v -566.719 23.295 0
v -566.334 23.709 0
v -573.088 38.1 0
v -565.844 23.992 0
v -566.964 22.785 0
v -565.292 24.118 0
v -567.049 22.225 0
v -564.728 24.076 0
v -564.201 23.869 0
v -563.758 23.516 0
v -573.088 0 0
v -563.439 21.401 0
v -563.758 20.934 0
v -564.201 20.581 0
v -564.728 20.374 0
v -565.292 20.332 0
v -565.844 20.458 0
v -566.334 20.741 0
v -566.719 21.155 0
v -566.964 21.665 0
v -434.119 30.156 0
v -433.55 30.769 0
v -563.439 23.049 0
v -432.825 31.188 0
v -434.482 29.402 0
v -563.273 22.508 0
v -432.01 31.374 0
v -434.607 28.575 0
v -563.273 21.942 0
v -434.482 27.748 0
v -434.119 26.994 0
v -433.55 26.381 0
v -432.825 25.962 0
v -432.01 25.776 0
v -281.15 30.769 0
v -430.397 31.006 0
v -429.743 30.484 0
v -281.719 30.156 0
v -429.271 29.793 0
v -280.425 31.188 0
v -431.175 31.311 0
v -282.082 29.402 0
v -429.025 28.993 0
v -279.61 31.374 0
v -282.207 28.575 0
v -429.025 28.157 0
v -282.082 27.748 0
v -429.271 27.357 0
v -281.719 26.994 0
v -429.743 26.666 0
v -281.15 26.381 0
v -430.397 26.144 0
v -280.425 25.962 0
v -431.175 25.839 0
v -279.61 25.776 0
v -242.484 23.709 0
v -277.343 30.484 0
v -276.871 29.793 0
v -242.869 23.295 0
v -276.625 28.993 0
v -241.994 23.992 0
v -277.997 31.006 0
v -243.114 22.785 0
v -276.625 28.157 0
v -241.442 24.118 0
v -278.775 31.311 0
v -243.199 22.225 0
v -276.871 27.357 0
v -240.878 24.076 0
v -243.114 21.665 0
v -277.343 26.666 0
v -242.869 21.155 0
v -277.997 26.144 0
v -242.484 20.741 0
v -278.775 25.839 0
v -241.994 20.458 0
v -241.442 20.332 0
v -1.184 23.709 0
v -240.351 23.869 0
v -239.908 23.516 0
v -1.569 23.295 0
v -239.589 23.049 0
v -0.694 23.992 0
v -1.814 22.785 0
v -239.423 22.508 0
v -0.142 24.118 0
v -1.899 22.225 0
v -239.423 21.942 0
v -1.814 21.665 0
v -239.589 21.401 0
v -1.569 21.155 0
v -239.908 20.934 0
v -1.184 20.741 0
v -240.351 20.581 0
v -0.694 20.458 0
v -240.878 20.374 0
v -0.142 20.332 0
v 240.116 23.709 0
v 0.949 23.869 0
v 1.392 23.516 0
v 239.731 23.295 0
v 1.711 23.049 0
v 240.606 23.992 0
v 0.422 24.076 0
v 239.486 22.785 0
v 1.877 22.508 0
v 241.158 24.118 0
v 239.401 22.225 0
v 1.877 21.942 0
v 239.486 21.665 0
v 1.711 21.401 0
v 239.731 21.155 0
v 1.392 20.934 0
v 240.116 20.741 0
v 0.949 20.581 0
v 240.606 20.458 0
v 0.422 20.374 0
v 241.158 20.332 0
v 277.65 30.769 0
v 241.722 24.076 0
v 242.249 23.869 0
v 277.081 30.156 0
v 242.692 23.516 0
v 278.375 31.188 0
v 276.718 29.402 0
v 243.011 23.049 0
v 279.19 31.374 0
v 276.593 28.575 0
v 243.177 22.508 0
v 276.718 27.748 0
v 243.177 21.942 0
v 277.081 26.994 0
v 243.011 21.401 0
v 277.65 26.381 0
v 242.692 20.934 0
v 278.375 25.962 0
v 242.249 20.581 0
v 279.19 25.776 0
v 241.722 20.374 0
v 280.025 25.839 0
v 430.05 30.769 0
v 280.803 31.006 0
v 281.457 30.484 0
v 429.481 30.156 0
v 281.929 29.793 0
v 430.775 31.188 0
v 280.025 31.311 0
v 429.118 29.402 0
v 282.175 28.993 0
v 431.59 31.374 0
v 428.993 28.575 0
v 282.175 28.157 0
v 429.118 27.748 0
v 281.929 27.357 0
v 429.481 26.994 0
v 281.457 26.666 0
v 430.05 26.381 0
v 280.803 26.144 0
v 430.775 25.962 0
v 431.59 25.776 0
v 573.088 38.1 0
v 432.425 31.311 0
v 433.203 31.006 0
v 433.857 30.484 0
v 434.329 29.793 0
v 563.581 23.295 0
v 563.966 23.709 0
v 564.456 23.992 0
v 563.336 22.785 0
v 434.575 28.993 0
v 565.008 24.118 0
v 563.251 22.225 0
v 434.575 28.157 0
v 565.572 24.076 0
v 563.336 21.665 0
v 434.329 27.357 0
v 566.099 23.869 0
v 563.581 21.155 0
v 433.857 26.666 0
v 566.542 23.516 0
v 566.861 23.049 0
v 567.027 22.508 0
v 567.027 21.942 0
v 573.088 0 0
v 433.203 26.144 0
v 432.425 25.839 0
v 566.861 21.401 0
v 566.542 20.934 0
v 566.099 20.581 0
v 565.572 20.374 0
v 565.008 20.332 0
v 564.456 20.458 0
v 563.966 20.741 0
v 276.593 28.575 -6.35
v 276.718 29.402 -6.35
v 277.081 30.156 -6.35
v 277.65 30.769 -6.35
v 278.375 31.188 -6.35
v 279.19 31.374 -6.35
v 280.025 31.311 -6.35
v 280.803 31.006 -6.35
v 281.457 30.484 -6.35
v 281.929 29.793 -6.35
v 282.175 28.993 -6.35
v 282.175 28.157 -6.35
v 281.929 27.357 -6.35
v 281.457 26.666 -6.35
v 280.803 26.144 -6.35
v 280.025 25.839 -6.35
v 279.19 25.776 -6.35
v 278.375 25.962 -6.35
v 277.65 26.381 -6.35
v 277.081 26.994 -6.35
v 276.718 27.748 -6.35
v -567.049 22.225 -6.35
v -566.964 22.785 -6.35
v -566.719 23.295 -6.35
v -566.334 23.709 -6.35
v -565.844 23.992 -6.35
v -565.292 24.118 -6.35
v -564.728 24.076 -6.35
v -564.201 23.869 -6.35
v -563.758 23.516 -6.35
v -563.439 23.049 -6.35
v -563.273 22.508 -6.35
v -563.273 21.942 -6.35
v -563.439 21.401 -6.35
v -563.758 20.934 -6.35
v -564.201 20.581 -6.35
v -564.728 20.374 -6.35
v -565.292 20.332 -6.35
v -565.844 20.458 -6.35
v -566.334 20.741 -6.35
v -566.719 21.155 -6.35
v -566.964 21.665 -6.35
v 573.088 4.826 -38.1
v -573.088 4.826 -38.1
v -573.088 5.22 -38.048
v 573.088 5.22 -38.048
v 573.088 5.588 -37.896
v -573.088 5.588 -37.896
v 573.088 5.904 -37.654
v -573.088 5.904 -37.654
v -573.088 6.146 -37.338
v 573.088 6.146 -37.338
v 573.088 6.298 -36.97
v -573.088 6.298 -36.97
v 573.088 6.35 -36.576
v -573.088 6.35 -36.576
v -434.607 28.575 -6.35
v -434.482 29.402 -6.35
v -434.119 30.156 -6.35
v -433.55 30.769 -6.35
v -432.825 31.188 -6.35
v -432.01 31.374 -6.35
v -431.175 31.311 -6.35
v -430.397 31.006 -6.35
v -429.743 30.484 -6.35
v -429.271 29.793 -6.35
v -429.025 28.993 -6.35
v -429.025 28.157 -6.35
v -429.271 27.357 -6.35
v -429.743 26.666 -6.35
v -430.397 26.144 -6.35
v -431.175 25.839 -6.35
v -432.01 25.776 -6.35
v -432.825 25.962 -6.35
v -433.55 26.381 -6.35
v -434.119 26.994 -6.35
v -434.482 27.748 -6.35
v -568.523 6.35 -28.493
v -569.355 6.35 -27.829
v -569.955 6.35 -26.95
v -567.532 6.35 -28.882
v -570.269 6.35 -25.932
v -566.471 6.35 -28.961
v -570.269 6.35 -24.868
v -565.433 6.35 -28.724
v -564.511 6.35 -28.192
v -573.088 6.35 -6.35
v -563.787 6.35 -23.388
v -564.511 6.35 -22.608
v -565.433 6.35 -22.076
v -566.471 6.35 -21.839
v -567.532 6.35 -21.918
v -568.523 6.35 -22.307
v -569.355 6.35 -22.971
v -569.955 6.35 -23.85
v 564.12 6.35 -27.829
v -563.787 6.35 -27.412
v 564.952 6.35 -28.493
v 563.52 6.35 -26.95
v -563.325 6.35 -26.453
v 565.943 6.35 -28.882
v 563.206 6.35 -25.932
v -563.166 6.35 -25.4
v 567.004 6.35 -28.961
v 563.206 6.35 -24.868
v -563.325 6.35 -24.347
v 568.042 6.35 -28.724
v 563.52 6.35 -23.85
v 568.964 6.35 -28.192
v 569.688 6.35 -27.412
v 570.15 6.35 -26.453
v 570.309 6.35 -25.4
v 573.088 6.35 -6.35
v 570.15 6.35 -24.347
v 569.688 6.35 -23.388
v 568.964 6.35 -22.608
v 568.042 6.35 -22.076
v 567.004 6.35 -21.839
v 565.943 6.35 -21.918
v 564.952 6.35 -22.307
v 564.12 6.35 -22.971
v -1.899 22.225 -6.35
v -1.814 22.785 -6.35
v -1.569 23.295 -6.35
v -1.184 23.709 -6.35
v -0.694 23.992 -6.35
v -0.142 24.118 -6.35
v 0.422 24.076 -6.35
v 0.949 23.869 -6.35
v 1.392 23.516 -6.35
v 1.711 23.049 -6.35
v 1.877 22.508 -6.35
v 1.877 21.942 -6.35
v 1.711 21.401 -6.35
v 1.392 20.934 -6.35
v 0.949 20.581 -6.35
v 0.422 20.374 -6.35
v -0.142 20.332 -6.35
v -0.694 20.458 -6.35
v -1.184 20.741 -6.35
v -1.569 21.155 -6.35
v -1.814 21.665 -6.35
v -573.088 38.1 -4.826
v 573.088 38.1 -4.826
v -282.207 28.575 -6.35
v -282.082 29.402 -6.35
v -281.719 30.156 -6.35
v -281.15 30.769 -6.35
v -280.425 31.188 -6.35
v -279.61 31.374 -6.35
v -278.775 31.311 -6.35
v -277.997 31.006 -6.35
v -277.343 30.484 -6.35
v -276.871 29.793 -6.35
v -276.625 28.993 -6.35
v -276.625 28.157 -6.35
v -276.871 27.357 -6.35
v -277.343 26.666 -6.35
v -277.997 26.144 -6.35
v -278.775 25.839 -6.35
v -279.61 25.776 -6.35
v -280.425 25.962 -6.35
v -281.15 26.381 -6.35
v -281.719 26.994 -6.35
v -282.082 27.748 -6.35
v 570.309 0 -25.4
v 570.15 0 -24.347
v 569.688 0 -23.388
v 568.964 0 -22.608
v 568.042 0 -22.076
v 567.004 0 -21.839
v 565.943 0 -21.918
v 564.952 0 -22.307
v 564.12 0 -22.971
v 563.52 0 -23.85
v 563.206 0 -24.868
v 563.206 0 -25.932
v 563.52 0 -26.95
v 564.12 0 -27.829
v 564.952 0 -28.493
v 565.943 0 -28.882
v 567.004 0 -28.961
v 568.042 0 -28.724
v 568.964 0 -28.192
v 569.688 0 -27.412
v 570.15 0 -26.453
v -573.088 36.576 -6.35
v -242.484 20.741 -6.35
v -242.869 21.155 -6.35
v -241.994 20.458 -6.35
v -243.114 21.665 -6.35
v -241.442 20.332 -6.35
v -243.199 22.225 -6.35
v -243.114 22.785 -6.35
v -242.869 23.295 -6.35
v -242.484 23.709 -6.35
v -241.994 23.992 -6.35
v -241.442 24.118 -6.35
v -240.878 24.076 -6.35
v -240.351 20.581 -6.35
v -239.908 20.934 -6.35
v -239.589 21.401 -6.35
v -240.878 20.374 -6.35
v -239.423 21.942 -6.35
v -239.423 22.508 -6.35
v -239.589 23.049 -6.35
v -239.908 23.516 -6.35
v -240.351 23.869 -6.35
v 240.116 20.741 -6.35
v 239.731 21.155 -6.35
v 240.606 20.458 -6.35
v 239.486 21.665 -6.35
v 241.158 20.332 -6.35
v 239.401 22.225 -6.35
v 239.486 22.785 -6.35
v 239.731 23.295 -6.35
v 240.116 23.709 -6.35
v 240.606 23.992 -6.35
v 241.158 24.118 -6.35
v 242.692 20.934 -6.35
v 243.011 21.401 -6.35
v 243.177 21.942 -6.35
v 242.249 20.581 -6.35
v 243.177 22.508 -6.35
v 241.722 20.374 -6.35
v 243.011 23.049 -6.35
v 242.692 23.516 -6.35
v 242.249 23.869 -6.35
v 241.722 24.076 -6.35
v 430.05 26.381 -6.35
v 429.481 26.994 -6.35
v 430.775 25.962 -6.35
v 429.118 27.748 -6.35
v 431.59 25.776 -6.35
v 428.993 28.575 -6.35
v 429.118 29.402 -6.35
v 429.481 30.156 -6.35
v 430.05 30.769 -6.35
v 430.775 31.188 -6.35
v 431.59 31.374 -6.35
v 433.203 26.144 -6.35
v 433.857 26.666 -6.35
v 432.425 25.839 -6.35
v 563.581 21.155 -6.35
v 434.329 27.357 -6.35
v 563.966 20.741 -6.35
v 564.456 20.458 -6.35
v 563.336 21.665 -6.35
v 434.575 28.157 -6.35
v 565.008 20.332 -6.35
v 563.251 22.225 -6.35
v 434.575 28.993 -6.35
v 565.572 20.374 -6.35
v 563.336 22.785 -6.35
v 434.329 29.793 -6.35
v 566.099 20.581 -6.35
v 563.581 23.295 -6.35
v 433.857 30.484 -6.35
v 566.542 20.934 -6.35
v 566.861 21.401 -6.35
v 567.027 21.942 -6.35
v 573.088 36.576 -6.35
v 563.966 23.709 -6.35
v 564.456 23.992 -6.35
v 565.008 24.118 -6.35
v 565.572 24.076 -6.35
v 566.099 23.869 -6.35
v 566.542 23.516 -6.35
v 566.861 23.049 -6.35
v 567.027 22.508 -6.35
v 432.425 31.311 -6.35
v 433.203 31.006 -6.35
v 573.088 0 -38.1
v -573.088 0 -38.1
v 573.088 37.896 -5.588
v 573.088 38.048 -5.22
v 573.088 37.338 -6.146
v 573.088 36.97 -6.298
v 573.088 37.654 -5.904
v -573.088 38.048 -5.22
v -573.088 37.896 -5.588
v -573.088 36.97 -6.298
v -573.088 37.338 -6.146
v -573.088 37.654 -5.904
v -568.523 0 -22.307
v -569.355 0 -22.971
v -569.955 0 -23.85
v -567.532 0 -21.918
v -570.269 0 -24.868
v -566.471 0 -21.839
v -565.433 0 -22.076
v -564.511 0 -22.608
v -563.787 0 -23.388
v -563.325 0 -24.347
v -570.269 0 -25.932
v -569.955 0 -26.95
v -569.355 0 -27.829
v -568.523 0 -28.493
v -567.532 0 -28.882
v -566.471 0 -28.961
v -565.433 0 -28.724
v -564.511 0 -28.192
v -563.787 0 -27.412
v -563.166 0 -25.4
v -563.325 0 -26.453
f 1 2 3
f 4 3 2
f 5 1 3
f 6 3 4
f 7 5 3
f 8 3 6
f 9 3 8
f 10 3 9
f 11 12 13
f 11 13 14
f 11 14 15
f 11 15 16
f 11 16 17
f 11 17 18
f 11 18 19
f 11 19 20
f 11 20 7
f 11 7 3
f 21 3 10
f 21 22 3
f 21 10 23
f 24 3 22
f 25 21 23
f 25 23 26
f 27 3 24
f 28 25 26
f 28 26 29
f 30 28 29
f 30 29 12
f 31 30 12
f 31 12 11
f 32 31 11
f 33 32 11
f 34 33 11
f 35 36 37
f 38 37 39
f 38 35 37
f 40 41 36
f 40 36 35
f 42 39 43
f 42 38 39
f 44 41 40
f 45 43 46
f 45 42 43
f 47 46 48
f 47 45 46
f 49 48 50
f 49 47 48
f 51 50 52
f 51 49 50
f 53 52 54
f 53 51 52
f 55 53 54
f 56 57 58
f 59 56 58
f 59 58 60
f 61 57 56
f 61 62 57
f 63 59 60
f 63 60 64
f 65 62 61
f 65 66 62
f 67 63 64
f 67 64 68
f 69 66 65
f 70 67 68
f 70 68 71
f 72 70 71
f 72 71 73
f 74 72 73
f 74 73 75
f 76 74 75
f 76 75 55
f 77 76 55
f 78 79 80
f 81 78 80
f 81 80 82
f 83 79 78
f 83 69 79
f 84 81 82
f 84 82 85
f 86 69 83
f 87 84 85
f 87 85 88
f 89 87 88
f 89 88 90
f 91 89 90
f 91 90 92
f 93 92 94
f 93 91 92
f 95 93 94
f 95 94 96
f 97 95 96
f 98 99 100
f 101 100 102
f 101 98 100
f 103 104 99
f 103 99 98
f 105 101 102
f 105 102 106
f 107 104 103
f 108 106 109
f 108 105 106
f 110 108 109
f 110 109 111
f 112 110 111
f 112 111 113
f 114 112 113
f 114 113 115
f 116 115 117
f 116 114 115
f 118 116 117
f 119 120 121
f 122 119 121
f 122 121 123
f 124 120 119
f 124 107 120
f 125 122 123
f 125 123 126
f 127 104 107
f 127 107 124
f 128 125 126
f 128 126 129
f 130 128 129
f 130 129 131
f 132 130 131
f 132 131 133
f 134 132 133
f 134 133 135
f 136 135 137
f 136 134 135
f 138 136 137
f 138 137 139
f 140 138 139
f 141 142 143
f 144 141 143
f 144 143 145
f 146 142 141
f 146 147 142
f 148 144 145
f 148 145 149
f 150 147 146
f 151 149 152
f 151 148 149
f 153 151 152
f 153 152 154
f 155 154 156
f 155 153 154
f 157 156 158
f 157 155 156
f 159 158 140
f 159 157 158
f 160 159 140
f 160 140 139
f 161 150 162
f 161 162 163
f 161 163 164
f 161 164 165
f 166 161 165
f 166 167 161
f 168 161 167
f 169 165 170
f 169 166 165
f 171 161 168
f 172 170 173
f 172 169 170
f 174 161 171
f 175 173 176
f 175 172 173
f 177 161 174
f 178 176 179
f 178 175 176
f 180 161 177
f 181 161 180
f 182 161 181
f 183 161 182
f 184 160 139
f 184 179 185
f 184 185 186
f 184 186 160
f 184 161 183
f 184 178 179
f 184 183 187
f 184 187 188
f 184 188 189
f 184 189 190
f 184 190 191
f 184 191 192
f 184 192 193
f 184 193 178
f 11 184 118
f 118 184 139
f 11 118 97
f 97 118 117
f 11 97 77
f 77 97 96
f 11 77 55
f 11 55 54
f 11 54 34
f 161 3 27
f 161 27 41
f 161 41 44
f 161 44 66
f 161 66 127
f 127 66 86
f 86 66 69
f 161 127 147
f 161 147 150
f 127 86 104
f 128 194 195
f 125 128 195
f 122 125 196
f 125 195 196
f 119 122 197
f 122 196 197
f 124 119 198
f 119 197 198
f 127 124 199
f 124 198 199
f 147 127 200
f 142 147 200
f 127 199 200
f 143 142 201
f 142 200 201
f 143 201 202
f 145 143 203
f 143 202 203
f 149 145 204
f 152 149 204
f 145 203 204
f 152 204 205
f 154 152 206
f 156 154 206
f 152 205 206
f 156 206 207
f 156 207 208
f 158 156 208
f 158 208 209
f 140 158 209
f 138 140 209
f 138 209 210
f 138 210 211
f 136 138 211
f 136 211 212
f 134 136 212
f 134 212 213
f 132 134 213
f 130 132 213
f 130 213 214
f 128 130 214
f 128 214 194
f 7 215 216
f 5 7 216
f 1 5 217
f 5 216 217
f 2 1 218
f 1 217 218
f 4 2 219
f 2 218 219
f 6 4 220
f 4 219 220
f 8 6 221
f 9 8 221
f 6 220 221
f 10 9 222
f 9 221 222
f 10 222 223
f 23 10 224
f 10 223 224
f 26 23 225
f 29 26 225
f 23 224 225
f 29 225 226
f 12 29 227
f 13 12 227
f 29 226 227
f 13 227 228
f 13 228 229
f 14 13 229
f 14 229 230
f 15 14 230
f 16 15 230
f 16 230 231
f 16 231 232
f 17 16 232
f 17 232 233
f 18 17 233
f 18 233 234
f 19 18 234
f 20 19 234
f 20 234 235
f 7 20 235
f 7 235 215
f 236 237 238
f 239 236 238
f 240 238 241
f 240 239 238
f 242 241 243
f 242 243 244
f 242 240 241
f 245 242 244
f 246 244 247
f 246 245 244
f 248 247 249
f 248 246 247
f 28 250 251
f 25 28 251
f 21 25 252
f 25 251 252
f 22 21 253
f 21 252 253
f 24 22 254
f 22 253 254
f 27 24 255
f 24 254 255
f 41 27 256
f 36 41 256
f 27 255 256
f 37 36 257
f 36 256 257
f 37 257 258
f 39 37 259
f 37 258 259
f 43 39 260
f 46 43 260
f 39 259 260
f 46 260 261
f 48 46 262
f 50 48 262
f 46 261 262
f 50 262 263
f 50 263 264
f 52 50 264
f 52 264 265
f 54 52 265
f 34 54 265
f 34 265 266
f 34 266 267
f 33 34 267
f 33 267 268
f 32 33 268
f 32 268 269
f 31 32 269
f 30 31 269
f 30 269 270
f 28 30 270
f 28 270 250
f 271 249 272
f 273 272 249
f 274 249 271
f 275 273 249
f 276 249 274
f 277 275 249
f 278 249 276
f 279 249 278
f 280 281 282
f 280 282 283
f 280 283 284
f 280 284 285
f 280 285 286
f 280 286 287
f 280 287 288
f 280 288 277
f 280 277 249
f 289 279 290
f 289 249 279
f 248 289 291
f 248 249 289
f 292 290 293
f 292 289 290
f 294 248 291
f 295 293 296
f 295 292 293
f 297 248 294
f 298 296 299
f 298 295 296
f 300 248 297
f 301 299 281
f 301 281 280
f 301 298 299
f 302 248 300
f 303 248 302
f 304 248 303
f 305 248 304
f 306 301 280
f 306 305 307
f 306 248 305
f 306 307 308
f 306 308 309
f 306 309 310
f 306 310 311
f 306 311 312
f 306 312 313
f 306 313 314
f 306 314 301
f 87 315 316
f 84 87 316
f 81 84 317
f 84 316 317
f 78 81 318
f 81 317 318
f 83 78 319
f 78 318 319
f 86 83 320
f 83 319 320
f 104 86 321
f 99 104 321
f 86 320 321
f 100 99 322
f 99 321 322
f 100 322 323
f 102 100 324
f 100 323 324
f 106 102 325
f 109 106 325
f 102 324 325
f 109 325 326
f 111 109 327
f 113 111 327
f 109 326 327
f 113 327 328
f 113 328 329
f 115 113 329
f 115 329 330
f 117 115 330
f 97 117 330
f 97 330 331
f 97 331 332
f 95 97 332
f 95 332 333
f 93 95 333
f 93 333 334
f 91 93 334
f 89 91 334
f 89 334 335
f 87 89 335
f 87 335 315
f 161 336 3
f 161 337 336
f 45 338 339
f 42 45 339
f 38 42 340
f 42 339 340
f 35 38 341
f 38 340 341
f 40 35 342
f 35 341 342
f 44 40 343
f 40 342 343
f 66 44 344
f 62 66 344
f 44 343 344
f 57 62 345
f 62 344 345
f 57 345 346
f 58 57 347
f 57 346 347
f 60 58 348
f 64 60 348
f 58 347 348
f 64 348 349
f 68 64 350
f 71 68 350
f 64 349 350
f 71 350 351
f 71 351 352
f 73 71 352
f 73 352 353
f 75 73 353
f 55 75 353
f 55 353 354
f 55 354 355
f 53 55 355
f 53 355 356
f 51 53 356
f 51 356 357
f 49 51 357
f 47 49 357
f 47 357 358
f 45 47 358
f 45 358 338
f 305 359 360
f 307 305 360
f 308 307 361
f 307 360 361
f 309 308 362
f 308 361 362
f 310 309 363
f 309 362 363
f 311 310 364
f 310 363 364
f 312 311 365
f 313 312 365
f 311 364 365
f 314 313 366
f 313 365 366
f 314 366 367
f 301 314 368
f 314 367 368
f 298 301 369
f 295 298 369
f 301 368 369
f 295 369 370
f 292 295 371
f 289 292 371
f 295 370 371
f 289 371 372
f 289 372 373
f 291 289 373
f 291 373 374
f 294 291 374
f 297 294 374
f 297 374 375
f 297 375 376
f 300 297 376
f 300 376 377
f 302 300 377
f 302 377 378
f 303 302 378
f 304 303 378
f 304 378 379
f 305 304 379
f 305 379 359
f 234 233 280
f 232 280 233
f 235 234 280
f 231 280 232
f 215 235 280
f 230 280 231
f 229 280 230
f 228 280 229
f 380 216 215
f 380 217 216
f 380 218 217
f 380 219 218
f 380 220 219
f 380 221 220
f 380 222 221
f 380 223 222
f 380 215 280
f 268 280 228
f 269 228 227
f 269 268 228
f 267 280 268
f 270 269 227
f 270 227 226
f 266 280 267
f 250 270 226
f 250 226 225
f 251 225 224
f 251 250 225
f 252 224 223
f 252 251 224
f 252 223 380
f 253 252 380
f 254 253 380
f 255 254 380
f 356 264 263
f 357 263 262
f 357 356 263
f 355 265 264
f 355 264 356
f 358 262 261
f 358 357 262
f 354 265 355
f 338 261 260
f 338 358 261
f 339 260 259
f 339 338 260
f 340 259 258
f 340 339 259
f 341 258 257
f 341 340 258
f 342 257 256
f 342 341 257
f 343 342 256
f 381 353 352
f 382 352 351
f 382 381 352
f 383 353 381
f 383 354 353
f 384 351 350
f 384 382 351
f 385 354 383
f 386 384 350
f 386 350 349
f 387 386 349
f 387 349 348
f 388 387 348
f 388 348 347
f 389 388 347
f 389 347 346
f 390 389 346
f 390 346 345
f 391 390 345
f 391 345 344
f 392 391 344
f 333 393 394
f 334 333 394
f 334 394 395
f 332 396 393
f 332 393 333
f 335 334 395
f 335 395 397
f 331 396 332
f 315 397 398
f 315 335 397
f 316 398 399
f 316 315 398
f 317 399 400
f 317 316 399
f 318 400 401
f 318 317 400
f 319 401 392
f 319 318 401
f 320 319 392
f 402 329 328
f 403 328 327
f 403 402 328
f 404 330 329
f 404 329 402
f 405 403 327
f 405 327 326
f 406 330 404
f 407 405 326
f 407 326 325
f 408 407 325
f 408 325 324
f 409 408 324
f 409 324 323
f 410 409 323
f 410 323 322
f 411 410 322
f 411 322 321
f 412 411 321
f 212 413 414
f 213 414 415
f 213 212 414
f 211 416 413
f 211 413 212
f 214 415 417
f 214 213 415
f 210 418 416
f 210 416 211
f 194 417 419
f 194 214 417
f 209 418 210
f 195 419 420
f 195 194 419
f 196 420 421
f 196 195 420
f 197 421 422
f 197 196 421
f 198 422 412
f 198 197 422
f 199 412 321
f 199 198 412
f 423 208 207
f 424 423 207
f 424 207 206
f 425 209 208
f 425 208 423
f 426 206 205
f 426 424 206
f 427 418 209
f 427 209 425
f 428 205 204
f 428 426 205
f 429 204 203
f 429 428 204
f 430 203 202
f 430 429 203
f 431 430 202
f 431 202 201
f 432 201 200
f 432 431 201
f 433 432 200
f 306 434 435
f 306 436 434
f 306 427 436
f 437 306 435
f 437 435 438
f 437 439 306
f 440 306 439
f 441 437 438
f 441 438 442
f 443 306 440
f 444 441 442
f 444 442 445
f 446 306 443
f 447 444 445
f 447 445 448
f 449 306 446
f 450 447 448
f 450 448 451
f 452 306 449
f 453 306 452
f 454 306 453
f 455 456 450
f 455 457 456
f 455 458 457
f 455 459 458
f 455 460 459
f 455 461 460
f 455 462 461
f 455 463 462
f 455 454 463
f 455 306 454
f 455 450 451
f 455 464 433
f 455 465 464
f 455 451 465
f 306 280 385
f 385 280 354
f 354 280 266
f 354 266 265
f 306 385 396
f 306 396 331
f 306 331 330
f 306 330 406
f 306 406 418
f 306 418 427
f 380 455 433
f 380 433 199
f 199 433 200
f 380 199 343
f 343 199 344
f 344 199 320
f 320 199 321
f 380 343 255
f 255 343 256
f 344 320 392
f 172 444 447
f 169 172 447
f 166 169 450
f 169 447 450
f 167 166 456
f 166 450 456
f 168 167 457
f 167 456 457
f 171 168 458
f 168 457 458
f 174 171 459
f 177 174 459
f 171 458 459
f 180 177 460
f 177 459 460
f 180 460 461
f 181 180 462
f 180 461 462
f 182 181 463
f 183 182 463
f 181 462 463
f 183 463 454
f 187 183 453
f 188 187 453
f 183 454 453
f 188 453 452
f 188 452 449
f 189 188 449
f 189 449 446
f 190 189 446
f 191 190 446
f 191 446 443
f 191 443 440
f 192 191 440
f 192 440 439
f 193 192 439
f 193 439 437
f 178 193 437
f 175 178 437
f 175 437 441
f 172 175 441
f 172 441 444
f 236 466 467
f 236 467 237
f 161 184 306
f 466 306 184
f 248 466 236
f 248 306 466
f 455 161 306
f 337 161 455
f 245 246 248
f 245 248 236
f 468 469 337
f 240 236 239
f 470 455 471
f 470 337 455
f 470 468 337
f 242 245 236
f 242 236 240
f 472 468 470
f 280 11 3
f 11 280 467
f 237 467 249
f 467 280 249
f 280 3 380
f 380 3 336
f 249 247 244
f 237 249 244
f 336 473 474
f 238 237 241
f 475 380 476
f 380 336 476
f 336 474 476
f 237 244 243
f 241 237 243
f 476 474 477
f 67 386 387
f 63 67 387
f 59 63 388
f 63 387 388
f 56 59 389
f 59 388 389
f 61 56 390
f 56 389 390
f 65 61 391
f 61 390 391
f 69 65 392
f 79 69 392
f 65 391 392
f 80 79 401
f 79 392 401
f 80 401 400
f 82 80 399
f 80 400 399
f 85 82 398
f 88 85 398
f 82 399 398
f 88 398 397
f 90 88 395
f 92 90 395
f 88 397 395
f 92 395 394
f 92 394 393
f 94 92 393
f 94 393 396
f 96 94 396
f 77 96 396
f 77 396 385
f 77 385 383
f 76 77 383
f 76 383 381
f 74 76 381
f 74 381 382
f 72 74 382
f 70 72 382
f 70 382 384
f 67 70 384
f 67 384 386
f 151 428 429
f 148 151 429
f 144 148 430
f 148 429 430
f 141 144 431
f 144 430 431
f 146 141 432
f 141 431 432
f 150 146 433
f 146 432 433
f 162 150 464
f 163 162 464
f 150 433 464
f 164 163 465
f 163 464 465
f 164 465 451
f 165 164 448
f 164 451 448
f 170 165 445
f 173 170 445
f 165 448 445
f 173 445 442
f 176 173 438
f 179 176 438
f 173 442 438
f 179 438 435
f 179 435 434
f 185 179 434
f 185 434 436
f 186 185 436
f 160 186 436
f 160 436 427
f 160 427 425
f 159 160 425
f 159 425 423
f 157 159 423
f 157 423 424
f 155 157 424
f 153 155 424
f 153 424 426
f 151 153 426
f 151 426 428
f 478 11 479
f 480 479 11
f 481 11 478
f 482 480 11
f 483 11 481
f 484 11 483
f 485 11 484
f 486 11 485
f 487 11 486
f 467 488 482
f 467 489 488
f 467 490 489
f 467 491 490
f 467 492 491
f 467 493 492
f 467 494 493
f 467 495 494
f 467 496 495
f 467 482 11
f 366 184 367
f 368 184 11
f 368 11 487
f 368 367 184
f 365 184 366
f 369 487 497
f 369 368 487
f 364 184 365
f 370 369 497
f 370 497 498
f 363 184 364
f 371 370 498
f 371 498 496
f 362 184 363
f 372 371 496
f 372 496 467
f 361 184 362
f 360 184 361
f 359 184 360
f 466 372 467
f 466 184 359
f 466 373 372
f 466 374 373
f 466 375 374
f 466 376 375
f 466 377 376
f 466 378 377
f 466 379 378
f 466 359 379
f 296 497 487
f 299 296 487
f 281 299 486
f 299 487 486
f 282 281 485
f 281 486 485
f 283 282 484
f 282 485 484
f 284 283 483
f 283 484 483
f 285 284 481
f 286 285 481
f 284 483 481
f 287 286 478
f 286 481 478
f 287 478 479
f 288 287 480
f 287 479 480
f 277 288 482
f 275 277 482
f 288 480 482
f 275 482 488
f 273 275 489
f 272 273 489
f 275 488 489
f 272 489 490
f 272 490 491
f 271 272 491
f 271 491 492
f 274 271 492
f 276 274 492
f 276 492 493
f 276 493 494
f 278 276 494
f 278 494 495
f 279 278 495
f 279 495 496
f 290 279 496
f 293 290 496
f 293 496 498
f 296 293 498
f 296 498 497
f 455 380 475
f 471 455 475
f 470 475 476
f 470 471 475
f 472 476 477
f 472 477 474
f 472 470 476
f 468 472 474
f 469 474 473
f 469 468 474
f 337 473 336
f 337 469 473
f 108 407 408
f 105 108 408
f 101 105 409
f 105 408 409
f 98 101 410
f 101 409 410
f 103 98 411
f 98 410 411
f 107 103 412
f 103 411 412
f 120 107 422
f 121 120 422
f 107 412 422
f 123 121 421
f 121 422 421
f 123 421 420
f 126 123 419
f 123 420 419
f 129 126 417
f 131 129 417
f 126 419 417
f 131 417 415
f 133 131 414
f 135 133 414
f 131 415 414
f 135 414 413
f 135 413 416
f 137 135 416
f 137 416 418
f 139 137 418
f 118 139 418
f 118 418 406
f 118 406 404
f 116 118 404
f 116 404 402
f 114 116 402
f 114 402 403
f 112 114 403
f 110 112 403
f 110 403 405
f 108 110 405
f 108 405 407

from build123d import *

# Parameters (mm, degrees)
EXTRUDE1_DEPTH          = 573.0875
F_1_4_CLEARANCE_HOLE1_D = 7.14248
F_10_24_TAPPED_HOLE1_D  = 3.7973
F_10_CLEARANCE_HOLE1_D  = 5.6134


with BuildPart() as part:
    # Sketch1 → Extrude1 (new, symmetric)
    with BuildSketch(Plane(origin=(0, 0, 0), x_dir=(0, 0, -1), z_dir=(1, 0, 0))):
        with BuildLine():
            Line((0, 38.1), (0, 0))
            Line((0, 0), (38.1, 0))
            Line((38.1, 0), (38.1, 4.826))
            ThreePointArc((38.1, 4.826), (37.653630735, 5.903630735), (36.576, 6.35))
            Line((36.576, 6.35), (6.35, 6.35))
            Line((6.35, 6.35), (6.35, 36.576))
            ThreePointArc((6.35, 36.576), (5.903630735, 37.653630735), (4.826, 38.1))
            Line((4.826, 38.1), (0, 38.1))
        make_face()
    extrude(amount=EXTRUDE1_DEPTH, both=True)

    # 1/4 Clearance Hole1 (through all)
    with Locations(Plane(origin=(0, 6.35, 0), x_dir=(-1, 0, 0), z_dir=(0, 1, 0))):
        with Locations((-566.7375, -25.4), (566.7375, -25.4)):
            Hole(F_1_4_CLEARANCE_HOLE1_D / 2)

    # #10-24 Tapped Hole1 (through all)
    with Locations(Plane.XY):
        with Locations((-565.15, 22.225), (565.15, 22.225), (-241.3, 22.225), (241.3, 22.225), (0, 22.225)):
            Hole(F_10_24_TAPPED_HOLE1_D / 2)

    # #10 Clearance Hole1 (through all)
    with Locations(Plane.XY):
        with Locations((-431.8, 28.575), (-279.4, 28.575), (279.4, 28.575), (431.8, 28.575)):
            Hole(F_10_CLEARANCE_HOLE1_D / 2)


solid = part.part
